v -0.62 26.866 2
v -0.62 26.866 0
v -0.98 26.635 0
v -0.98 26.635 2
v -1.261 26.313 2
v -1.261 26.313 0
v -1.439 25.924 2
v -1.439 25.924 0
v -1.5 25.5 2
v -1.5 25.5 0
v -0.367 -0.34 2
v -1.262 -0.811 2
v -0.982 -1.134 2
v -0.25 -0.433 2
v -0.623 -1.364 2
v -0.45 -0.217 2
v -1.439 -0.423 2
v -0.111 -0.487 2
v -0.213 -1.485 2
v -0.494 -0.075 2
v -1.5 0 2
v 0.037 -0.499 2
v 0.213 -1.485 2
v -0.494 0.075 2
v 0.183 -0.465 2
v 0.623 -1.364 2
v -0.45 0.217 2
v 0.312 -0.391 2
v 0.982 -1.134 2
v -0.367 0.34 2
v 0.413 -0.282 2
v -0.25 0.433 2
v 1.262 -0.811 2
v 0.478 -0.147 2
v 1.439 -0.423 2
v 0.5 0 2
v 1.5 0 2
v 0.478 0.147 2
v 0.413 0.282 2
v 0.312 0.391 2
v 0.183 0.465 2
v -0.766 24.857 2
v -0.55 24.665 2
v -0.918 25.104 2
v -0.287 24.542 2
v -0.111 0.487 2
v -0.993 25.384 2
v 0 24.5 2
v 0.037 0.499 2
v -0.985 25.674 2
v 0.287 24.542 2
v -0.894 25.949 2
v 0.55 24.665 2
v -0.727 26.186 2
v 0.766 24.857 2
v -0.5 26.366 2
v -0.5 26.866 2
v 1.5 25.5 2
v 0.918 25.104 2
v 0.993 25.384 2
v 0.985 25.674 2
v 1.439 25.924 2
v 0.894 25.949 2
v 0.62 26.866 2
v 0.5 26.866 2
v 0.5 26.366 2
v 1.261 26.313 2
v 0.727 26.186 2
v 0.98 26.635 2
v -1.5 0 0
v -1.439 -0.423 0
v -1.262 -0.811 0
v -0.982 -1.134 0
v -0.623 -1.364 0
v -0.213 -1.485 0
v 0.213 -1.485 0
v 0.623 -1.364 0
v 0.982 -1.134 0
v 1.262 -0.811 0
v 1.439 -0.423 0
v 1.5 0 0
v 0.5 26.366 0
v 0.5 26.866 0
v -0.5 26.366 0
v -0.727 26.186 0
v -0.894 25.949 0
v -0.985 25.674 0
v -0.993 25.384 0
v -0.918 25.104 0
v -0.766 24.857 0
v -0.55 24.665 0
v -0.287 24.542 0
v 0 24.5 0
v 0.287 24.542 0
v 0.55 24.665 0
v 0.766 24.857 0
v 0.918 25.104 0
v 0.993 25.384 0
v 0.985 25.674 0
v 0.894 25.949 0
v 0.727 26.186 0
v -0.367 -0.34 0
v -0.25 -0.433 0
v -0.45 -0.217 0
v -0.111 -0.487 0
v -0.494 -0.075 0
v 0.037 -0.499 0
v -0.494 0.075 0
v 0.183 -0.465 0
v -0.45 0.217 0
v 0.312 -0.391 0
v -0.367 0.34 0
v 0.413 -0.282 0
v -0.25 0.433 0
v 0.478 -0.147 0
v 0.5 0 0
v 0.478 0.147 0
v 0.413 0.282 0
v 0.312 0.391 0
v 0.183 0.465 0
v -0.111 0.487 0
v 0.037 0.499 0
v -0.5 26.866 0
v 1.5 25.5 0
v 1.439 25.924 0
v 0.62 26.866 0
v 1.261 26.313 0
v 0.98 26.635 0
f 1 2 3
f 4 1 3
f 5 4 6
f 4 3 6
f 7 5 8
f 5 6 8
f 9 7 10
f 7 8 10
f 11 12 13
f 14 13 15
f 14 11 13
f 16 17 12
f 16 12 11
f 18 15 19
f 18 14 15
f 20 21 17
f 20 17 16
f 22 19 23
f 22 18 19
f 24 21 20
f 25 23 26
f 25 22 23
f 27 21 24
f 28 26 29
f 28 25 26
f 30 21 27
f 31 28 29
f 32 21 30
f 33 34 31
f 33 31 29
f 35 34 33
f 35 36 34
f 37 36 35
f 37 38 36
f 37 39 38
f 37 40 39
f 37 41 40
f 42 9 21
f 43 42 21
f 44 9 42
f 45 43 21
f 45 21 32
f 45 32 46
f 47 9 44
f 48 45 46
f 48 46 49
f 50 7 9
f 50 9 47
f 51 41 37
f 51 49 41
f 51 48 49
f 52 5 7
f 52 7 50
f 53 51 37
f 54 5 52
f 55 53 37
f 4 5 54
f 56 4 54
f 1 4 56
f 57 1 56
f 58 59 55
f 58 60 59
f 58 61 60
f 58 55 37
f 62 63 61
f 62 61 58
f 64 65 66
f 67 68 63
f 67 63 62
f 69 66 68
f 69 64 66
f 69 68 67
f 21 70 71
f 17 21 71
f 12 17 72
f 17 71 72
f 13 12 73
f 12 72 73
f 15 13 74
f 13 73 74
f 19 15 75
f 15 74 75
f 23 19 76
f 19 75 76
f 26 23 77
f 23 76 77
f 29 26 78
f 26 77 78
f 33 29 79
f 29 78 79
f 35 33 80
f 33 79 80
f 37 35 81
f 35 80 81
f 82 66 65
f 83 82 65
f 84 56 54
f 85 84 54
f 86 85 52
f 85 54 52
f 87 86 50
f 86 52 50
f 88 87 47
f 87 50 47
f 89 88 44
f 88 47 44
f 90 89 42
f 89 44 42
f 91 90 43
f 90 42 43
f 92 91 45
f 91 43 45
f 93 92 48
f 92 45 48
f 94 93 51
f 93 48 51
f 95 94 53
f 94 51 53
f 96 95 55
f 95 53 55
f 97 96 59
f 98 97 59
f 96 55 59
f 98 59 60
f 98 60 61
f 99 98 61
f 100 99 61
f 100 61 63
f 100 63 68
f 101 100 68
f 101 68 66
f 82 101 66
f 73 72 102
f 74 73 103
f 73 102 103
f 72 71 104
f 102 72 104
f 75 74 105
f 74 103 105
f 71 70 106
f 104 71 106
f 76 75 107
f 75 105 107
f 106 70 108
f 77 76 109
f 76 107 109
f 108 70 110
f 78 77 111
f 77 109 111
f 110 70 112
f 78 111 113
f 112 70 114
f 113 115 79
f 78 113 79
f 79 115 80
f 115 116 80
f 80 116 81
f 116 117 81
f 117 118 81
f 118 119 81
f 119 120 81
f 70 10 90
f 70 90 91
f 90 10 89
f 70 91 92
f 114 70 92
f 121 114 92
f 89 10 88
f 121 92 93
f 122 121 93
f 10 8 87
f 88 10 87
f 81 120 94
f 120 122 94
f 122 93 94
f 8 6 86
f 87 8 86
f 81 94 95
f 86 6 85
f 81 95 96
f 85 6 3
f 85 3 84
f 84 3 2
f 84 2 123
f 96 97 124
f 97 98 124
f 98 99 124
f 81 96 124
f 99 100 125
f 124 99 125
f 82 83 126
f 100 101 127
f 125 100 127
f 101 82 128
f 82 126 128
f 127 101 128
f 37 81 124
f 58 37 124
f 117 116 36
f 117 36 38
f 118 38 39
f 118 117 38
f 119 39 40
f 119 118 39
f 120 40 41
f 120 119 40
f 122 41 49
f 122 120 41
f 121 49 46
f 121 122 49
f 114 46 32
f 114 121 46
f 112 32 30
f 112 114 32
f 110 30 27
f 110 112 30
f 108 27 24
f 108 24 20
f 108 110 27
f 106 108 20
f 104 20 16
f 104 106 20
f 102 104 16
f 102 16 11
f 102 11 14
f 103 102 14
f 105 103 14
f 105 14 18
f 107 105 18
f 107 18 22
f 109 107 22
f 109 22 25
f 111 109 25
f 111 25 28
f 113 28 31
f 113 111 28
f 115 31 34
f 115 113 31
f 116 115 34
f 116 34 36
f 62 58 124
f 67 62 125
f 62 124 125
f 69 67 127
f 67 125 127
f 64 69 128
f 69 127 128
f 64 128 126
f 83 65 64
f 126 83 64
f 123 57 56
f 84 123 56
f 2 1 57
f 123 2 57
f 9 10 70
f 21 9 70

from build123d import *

# Parameters (mm, degrees)
SKETCH_1_R          = 0.5
EXTRUDE_1_DEPTH     = 2
CUT_EXTRUDE_1_DEPTH = 10


with BuildPart() as part:
    # 草图1 → 凸台-拉伸1 (new body)
    with BuildSketch(Plane.XY):
        with BuildLine():
            Line((-1.5, 25.5), (-1.5, 0))
            ThreePointArc((-1.5, 0), (0, -1.5), (1.5, 0))
            Line((1.5, 0), (1.5, 25.5))
            ThreePointArc((1.5, 25.5), (0, 27), (-1.5, 25.5))
        make_face()
        Circle(SKETCH_1_R, mode=Mode.SUBTRACT)
    extrude(amount=EXTRUDE_1_DEPTH)

    # 草图2 → 切除-拉伸1 (cut)
    with BuildSketch(Plane.XY.offset(2)):
        with BuildLine():
            Line((-0.5, 26.866025404), (-0.5, 26.366025404))
            ThreePointArc((-0.5, 26.366025404), (0, 24.5), (0.5, 26.366025404))
            Line((0.5, 26.366025404), (0.5, 26.866025404))
            Line((0.5, 26.866025404), (0.619656837, 26.866025404))
            ThreePointArc((0.619656837, 26.866025404), (0, 27), (-0.619656837, 26.866025404))
            Line((-0.619656837, 26.866025404), (-0.5, 26.866025404))
        make_face()
    extrude(amount=-CUT_EXTRUDE_1_DEPTH, mode=Mode.SUBTRACT)


solid = part.part
